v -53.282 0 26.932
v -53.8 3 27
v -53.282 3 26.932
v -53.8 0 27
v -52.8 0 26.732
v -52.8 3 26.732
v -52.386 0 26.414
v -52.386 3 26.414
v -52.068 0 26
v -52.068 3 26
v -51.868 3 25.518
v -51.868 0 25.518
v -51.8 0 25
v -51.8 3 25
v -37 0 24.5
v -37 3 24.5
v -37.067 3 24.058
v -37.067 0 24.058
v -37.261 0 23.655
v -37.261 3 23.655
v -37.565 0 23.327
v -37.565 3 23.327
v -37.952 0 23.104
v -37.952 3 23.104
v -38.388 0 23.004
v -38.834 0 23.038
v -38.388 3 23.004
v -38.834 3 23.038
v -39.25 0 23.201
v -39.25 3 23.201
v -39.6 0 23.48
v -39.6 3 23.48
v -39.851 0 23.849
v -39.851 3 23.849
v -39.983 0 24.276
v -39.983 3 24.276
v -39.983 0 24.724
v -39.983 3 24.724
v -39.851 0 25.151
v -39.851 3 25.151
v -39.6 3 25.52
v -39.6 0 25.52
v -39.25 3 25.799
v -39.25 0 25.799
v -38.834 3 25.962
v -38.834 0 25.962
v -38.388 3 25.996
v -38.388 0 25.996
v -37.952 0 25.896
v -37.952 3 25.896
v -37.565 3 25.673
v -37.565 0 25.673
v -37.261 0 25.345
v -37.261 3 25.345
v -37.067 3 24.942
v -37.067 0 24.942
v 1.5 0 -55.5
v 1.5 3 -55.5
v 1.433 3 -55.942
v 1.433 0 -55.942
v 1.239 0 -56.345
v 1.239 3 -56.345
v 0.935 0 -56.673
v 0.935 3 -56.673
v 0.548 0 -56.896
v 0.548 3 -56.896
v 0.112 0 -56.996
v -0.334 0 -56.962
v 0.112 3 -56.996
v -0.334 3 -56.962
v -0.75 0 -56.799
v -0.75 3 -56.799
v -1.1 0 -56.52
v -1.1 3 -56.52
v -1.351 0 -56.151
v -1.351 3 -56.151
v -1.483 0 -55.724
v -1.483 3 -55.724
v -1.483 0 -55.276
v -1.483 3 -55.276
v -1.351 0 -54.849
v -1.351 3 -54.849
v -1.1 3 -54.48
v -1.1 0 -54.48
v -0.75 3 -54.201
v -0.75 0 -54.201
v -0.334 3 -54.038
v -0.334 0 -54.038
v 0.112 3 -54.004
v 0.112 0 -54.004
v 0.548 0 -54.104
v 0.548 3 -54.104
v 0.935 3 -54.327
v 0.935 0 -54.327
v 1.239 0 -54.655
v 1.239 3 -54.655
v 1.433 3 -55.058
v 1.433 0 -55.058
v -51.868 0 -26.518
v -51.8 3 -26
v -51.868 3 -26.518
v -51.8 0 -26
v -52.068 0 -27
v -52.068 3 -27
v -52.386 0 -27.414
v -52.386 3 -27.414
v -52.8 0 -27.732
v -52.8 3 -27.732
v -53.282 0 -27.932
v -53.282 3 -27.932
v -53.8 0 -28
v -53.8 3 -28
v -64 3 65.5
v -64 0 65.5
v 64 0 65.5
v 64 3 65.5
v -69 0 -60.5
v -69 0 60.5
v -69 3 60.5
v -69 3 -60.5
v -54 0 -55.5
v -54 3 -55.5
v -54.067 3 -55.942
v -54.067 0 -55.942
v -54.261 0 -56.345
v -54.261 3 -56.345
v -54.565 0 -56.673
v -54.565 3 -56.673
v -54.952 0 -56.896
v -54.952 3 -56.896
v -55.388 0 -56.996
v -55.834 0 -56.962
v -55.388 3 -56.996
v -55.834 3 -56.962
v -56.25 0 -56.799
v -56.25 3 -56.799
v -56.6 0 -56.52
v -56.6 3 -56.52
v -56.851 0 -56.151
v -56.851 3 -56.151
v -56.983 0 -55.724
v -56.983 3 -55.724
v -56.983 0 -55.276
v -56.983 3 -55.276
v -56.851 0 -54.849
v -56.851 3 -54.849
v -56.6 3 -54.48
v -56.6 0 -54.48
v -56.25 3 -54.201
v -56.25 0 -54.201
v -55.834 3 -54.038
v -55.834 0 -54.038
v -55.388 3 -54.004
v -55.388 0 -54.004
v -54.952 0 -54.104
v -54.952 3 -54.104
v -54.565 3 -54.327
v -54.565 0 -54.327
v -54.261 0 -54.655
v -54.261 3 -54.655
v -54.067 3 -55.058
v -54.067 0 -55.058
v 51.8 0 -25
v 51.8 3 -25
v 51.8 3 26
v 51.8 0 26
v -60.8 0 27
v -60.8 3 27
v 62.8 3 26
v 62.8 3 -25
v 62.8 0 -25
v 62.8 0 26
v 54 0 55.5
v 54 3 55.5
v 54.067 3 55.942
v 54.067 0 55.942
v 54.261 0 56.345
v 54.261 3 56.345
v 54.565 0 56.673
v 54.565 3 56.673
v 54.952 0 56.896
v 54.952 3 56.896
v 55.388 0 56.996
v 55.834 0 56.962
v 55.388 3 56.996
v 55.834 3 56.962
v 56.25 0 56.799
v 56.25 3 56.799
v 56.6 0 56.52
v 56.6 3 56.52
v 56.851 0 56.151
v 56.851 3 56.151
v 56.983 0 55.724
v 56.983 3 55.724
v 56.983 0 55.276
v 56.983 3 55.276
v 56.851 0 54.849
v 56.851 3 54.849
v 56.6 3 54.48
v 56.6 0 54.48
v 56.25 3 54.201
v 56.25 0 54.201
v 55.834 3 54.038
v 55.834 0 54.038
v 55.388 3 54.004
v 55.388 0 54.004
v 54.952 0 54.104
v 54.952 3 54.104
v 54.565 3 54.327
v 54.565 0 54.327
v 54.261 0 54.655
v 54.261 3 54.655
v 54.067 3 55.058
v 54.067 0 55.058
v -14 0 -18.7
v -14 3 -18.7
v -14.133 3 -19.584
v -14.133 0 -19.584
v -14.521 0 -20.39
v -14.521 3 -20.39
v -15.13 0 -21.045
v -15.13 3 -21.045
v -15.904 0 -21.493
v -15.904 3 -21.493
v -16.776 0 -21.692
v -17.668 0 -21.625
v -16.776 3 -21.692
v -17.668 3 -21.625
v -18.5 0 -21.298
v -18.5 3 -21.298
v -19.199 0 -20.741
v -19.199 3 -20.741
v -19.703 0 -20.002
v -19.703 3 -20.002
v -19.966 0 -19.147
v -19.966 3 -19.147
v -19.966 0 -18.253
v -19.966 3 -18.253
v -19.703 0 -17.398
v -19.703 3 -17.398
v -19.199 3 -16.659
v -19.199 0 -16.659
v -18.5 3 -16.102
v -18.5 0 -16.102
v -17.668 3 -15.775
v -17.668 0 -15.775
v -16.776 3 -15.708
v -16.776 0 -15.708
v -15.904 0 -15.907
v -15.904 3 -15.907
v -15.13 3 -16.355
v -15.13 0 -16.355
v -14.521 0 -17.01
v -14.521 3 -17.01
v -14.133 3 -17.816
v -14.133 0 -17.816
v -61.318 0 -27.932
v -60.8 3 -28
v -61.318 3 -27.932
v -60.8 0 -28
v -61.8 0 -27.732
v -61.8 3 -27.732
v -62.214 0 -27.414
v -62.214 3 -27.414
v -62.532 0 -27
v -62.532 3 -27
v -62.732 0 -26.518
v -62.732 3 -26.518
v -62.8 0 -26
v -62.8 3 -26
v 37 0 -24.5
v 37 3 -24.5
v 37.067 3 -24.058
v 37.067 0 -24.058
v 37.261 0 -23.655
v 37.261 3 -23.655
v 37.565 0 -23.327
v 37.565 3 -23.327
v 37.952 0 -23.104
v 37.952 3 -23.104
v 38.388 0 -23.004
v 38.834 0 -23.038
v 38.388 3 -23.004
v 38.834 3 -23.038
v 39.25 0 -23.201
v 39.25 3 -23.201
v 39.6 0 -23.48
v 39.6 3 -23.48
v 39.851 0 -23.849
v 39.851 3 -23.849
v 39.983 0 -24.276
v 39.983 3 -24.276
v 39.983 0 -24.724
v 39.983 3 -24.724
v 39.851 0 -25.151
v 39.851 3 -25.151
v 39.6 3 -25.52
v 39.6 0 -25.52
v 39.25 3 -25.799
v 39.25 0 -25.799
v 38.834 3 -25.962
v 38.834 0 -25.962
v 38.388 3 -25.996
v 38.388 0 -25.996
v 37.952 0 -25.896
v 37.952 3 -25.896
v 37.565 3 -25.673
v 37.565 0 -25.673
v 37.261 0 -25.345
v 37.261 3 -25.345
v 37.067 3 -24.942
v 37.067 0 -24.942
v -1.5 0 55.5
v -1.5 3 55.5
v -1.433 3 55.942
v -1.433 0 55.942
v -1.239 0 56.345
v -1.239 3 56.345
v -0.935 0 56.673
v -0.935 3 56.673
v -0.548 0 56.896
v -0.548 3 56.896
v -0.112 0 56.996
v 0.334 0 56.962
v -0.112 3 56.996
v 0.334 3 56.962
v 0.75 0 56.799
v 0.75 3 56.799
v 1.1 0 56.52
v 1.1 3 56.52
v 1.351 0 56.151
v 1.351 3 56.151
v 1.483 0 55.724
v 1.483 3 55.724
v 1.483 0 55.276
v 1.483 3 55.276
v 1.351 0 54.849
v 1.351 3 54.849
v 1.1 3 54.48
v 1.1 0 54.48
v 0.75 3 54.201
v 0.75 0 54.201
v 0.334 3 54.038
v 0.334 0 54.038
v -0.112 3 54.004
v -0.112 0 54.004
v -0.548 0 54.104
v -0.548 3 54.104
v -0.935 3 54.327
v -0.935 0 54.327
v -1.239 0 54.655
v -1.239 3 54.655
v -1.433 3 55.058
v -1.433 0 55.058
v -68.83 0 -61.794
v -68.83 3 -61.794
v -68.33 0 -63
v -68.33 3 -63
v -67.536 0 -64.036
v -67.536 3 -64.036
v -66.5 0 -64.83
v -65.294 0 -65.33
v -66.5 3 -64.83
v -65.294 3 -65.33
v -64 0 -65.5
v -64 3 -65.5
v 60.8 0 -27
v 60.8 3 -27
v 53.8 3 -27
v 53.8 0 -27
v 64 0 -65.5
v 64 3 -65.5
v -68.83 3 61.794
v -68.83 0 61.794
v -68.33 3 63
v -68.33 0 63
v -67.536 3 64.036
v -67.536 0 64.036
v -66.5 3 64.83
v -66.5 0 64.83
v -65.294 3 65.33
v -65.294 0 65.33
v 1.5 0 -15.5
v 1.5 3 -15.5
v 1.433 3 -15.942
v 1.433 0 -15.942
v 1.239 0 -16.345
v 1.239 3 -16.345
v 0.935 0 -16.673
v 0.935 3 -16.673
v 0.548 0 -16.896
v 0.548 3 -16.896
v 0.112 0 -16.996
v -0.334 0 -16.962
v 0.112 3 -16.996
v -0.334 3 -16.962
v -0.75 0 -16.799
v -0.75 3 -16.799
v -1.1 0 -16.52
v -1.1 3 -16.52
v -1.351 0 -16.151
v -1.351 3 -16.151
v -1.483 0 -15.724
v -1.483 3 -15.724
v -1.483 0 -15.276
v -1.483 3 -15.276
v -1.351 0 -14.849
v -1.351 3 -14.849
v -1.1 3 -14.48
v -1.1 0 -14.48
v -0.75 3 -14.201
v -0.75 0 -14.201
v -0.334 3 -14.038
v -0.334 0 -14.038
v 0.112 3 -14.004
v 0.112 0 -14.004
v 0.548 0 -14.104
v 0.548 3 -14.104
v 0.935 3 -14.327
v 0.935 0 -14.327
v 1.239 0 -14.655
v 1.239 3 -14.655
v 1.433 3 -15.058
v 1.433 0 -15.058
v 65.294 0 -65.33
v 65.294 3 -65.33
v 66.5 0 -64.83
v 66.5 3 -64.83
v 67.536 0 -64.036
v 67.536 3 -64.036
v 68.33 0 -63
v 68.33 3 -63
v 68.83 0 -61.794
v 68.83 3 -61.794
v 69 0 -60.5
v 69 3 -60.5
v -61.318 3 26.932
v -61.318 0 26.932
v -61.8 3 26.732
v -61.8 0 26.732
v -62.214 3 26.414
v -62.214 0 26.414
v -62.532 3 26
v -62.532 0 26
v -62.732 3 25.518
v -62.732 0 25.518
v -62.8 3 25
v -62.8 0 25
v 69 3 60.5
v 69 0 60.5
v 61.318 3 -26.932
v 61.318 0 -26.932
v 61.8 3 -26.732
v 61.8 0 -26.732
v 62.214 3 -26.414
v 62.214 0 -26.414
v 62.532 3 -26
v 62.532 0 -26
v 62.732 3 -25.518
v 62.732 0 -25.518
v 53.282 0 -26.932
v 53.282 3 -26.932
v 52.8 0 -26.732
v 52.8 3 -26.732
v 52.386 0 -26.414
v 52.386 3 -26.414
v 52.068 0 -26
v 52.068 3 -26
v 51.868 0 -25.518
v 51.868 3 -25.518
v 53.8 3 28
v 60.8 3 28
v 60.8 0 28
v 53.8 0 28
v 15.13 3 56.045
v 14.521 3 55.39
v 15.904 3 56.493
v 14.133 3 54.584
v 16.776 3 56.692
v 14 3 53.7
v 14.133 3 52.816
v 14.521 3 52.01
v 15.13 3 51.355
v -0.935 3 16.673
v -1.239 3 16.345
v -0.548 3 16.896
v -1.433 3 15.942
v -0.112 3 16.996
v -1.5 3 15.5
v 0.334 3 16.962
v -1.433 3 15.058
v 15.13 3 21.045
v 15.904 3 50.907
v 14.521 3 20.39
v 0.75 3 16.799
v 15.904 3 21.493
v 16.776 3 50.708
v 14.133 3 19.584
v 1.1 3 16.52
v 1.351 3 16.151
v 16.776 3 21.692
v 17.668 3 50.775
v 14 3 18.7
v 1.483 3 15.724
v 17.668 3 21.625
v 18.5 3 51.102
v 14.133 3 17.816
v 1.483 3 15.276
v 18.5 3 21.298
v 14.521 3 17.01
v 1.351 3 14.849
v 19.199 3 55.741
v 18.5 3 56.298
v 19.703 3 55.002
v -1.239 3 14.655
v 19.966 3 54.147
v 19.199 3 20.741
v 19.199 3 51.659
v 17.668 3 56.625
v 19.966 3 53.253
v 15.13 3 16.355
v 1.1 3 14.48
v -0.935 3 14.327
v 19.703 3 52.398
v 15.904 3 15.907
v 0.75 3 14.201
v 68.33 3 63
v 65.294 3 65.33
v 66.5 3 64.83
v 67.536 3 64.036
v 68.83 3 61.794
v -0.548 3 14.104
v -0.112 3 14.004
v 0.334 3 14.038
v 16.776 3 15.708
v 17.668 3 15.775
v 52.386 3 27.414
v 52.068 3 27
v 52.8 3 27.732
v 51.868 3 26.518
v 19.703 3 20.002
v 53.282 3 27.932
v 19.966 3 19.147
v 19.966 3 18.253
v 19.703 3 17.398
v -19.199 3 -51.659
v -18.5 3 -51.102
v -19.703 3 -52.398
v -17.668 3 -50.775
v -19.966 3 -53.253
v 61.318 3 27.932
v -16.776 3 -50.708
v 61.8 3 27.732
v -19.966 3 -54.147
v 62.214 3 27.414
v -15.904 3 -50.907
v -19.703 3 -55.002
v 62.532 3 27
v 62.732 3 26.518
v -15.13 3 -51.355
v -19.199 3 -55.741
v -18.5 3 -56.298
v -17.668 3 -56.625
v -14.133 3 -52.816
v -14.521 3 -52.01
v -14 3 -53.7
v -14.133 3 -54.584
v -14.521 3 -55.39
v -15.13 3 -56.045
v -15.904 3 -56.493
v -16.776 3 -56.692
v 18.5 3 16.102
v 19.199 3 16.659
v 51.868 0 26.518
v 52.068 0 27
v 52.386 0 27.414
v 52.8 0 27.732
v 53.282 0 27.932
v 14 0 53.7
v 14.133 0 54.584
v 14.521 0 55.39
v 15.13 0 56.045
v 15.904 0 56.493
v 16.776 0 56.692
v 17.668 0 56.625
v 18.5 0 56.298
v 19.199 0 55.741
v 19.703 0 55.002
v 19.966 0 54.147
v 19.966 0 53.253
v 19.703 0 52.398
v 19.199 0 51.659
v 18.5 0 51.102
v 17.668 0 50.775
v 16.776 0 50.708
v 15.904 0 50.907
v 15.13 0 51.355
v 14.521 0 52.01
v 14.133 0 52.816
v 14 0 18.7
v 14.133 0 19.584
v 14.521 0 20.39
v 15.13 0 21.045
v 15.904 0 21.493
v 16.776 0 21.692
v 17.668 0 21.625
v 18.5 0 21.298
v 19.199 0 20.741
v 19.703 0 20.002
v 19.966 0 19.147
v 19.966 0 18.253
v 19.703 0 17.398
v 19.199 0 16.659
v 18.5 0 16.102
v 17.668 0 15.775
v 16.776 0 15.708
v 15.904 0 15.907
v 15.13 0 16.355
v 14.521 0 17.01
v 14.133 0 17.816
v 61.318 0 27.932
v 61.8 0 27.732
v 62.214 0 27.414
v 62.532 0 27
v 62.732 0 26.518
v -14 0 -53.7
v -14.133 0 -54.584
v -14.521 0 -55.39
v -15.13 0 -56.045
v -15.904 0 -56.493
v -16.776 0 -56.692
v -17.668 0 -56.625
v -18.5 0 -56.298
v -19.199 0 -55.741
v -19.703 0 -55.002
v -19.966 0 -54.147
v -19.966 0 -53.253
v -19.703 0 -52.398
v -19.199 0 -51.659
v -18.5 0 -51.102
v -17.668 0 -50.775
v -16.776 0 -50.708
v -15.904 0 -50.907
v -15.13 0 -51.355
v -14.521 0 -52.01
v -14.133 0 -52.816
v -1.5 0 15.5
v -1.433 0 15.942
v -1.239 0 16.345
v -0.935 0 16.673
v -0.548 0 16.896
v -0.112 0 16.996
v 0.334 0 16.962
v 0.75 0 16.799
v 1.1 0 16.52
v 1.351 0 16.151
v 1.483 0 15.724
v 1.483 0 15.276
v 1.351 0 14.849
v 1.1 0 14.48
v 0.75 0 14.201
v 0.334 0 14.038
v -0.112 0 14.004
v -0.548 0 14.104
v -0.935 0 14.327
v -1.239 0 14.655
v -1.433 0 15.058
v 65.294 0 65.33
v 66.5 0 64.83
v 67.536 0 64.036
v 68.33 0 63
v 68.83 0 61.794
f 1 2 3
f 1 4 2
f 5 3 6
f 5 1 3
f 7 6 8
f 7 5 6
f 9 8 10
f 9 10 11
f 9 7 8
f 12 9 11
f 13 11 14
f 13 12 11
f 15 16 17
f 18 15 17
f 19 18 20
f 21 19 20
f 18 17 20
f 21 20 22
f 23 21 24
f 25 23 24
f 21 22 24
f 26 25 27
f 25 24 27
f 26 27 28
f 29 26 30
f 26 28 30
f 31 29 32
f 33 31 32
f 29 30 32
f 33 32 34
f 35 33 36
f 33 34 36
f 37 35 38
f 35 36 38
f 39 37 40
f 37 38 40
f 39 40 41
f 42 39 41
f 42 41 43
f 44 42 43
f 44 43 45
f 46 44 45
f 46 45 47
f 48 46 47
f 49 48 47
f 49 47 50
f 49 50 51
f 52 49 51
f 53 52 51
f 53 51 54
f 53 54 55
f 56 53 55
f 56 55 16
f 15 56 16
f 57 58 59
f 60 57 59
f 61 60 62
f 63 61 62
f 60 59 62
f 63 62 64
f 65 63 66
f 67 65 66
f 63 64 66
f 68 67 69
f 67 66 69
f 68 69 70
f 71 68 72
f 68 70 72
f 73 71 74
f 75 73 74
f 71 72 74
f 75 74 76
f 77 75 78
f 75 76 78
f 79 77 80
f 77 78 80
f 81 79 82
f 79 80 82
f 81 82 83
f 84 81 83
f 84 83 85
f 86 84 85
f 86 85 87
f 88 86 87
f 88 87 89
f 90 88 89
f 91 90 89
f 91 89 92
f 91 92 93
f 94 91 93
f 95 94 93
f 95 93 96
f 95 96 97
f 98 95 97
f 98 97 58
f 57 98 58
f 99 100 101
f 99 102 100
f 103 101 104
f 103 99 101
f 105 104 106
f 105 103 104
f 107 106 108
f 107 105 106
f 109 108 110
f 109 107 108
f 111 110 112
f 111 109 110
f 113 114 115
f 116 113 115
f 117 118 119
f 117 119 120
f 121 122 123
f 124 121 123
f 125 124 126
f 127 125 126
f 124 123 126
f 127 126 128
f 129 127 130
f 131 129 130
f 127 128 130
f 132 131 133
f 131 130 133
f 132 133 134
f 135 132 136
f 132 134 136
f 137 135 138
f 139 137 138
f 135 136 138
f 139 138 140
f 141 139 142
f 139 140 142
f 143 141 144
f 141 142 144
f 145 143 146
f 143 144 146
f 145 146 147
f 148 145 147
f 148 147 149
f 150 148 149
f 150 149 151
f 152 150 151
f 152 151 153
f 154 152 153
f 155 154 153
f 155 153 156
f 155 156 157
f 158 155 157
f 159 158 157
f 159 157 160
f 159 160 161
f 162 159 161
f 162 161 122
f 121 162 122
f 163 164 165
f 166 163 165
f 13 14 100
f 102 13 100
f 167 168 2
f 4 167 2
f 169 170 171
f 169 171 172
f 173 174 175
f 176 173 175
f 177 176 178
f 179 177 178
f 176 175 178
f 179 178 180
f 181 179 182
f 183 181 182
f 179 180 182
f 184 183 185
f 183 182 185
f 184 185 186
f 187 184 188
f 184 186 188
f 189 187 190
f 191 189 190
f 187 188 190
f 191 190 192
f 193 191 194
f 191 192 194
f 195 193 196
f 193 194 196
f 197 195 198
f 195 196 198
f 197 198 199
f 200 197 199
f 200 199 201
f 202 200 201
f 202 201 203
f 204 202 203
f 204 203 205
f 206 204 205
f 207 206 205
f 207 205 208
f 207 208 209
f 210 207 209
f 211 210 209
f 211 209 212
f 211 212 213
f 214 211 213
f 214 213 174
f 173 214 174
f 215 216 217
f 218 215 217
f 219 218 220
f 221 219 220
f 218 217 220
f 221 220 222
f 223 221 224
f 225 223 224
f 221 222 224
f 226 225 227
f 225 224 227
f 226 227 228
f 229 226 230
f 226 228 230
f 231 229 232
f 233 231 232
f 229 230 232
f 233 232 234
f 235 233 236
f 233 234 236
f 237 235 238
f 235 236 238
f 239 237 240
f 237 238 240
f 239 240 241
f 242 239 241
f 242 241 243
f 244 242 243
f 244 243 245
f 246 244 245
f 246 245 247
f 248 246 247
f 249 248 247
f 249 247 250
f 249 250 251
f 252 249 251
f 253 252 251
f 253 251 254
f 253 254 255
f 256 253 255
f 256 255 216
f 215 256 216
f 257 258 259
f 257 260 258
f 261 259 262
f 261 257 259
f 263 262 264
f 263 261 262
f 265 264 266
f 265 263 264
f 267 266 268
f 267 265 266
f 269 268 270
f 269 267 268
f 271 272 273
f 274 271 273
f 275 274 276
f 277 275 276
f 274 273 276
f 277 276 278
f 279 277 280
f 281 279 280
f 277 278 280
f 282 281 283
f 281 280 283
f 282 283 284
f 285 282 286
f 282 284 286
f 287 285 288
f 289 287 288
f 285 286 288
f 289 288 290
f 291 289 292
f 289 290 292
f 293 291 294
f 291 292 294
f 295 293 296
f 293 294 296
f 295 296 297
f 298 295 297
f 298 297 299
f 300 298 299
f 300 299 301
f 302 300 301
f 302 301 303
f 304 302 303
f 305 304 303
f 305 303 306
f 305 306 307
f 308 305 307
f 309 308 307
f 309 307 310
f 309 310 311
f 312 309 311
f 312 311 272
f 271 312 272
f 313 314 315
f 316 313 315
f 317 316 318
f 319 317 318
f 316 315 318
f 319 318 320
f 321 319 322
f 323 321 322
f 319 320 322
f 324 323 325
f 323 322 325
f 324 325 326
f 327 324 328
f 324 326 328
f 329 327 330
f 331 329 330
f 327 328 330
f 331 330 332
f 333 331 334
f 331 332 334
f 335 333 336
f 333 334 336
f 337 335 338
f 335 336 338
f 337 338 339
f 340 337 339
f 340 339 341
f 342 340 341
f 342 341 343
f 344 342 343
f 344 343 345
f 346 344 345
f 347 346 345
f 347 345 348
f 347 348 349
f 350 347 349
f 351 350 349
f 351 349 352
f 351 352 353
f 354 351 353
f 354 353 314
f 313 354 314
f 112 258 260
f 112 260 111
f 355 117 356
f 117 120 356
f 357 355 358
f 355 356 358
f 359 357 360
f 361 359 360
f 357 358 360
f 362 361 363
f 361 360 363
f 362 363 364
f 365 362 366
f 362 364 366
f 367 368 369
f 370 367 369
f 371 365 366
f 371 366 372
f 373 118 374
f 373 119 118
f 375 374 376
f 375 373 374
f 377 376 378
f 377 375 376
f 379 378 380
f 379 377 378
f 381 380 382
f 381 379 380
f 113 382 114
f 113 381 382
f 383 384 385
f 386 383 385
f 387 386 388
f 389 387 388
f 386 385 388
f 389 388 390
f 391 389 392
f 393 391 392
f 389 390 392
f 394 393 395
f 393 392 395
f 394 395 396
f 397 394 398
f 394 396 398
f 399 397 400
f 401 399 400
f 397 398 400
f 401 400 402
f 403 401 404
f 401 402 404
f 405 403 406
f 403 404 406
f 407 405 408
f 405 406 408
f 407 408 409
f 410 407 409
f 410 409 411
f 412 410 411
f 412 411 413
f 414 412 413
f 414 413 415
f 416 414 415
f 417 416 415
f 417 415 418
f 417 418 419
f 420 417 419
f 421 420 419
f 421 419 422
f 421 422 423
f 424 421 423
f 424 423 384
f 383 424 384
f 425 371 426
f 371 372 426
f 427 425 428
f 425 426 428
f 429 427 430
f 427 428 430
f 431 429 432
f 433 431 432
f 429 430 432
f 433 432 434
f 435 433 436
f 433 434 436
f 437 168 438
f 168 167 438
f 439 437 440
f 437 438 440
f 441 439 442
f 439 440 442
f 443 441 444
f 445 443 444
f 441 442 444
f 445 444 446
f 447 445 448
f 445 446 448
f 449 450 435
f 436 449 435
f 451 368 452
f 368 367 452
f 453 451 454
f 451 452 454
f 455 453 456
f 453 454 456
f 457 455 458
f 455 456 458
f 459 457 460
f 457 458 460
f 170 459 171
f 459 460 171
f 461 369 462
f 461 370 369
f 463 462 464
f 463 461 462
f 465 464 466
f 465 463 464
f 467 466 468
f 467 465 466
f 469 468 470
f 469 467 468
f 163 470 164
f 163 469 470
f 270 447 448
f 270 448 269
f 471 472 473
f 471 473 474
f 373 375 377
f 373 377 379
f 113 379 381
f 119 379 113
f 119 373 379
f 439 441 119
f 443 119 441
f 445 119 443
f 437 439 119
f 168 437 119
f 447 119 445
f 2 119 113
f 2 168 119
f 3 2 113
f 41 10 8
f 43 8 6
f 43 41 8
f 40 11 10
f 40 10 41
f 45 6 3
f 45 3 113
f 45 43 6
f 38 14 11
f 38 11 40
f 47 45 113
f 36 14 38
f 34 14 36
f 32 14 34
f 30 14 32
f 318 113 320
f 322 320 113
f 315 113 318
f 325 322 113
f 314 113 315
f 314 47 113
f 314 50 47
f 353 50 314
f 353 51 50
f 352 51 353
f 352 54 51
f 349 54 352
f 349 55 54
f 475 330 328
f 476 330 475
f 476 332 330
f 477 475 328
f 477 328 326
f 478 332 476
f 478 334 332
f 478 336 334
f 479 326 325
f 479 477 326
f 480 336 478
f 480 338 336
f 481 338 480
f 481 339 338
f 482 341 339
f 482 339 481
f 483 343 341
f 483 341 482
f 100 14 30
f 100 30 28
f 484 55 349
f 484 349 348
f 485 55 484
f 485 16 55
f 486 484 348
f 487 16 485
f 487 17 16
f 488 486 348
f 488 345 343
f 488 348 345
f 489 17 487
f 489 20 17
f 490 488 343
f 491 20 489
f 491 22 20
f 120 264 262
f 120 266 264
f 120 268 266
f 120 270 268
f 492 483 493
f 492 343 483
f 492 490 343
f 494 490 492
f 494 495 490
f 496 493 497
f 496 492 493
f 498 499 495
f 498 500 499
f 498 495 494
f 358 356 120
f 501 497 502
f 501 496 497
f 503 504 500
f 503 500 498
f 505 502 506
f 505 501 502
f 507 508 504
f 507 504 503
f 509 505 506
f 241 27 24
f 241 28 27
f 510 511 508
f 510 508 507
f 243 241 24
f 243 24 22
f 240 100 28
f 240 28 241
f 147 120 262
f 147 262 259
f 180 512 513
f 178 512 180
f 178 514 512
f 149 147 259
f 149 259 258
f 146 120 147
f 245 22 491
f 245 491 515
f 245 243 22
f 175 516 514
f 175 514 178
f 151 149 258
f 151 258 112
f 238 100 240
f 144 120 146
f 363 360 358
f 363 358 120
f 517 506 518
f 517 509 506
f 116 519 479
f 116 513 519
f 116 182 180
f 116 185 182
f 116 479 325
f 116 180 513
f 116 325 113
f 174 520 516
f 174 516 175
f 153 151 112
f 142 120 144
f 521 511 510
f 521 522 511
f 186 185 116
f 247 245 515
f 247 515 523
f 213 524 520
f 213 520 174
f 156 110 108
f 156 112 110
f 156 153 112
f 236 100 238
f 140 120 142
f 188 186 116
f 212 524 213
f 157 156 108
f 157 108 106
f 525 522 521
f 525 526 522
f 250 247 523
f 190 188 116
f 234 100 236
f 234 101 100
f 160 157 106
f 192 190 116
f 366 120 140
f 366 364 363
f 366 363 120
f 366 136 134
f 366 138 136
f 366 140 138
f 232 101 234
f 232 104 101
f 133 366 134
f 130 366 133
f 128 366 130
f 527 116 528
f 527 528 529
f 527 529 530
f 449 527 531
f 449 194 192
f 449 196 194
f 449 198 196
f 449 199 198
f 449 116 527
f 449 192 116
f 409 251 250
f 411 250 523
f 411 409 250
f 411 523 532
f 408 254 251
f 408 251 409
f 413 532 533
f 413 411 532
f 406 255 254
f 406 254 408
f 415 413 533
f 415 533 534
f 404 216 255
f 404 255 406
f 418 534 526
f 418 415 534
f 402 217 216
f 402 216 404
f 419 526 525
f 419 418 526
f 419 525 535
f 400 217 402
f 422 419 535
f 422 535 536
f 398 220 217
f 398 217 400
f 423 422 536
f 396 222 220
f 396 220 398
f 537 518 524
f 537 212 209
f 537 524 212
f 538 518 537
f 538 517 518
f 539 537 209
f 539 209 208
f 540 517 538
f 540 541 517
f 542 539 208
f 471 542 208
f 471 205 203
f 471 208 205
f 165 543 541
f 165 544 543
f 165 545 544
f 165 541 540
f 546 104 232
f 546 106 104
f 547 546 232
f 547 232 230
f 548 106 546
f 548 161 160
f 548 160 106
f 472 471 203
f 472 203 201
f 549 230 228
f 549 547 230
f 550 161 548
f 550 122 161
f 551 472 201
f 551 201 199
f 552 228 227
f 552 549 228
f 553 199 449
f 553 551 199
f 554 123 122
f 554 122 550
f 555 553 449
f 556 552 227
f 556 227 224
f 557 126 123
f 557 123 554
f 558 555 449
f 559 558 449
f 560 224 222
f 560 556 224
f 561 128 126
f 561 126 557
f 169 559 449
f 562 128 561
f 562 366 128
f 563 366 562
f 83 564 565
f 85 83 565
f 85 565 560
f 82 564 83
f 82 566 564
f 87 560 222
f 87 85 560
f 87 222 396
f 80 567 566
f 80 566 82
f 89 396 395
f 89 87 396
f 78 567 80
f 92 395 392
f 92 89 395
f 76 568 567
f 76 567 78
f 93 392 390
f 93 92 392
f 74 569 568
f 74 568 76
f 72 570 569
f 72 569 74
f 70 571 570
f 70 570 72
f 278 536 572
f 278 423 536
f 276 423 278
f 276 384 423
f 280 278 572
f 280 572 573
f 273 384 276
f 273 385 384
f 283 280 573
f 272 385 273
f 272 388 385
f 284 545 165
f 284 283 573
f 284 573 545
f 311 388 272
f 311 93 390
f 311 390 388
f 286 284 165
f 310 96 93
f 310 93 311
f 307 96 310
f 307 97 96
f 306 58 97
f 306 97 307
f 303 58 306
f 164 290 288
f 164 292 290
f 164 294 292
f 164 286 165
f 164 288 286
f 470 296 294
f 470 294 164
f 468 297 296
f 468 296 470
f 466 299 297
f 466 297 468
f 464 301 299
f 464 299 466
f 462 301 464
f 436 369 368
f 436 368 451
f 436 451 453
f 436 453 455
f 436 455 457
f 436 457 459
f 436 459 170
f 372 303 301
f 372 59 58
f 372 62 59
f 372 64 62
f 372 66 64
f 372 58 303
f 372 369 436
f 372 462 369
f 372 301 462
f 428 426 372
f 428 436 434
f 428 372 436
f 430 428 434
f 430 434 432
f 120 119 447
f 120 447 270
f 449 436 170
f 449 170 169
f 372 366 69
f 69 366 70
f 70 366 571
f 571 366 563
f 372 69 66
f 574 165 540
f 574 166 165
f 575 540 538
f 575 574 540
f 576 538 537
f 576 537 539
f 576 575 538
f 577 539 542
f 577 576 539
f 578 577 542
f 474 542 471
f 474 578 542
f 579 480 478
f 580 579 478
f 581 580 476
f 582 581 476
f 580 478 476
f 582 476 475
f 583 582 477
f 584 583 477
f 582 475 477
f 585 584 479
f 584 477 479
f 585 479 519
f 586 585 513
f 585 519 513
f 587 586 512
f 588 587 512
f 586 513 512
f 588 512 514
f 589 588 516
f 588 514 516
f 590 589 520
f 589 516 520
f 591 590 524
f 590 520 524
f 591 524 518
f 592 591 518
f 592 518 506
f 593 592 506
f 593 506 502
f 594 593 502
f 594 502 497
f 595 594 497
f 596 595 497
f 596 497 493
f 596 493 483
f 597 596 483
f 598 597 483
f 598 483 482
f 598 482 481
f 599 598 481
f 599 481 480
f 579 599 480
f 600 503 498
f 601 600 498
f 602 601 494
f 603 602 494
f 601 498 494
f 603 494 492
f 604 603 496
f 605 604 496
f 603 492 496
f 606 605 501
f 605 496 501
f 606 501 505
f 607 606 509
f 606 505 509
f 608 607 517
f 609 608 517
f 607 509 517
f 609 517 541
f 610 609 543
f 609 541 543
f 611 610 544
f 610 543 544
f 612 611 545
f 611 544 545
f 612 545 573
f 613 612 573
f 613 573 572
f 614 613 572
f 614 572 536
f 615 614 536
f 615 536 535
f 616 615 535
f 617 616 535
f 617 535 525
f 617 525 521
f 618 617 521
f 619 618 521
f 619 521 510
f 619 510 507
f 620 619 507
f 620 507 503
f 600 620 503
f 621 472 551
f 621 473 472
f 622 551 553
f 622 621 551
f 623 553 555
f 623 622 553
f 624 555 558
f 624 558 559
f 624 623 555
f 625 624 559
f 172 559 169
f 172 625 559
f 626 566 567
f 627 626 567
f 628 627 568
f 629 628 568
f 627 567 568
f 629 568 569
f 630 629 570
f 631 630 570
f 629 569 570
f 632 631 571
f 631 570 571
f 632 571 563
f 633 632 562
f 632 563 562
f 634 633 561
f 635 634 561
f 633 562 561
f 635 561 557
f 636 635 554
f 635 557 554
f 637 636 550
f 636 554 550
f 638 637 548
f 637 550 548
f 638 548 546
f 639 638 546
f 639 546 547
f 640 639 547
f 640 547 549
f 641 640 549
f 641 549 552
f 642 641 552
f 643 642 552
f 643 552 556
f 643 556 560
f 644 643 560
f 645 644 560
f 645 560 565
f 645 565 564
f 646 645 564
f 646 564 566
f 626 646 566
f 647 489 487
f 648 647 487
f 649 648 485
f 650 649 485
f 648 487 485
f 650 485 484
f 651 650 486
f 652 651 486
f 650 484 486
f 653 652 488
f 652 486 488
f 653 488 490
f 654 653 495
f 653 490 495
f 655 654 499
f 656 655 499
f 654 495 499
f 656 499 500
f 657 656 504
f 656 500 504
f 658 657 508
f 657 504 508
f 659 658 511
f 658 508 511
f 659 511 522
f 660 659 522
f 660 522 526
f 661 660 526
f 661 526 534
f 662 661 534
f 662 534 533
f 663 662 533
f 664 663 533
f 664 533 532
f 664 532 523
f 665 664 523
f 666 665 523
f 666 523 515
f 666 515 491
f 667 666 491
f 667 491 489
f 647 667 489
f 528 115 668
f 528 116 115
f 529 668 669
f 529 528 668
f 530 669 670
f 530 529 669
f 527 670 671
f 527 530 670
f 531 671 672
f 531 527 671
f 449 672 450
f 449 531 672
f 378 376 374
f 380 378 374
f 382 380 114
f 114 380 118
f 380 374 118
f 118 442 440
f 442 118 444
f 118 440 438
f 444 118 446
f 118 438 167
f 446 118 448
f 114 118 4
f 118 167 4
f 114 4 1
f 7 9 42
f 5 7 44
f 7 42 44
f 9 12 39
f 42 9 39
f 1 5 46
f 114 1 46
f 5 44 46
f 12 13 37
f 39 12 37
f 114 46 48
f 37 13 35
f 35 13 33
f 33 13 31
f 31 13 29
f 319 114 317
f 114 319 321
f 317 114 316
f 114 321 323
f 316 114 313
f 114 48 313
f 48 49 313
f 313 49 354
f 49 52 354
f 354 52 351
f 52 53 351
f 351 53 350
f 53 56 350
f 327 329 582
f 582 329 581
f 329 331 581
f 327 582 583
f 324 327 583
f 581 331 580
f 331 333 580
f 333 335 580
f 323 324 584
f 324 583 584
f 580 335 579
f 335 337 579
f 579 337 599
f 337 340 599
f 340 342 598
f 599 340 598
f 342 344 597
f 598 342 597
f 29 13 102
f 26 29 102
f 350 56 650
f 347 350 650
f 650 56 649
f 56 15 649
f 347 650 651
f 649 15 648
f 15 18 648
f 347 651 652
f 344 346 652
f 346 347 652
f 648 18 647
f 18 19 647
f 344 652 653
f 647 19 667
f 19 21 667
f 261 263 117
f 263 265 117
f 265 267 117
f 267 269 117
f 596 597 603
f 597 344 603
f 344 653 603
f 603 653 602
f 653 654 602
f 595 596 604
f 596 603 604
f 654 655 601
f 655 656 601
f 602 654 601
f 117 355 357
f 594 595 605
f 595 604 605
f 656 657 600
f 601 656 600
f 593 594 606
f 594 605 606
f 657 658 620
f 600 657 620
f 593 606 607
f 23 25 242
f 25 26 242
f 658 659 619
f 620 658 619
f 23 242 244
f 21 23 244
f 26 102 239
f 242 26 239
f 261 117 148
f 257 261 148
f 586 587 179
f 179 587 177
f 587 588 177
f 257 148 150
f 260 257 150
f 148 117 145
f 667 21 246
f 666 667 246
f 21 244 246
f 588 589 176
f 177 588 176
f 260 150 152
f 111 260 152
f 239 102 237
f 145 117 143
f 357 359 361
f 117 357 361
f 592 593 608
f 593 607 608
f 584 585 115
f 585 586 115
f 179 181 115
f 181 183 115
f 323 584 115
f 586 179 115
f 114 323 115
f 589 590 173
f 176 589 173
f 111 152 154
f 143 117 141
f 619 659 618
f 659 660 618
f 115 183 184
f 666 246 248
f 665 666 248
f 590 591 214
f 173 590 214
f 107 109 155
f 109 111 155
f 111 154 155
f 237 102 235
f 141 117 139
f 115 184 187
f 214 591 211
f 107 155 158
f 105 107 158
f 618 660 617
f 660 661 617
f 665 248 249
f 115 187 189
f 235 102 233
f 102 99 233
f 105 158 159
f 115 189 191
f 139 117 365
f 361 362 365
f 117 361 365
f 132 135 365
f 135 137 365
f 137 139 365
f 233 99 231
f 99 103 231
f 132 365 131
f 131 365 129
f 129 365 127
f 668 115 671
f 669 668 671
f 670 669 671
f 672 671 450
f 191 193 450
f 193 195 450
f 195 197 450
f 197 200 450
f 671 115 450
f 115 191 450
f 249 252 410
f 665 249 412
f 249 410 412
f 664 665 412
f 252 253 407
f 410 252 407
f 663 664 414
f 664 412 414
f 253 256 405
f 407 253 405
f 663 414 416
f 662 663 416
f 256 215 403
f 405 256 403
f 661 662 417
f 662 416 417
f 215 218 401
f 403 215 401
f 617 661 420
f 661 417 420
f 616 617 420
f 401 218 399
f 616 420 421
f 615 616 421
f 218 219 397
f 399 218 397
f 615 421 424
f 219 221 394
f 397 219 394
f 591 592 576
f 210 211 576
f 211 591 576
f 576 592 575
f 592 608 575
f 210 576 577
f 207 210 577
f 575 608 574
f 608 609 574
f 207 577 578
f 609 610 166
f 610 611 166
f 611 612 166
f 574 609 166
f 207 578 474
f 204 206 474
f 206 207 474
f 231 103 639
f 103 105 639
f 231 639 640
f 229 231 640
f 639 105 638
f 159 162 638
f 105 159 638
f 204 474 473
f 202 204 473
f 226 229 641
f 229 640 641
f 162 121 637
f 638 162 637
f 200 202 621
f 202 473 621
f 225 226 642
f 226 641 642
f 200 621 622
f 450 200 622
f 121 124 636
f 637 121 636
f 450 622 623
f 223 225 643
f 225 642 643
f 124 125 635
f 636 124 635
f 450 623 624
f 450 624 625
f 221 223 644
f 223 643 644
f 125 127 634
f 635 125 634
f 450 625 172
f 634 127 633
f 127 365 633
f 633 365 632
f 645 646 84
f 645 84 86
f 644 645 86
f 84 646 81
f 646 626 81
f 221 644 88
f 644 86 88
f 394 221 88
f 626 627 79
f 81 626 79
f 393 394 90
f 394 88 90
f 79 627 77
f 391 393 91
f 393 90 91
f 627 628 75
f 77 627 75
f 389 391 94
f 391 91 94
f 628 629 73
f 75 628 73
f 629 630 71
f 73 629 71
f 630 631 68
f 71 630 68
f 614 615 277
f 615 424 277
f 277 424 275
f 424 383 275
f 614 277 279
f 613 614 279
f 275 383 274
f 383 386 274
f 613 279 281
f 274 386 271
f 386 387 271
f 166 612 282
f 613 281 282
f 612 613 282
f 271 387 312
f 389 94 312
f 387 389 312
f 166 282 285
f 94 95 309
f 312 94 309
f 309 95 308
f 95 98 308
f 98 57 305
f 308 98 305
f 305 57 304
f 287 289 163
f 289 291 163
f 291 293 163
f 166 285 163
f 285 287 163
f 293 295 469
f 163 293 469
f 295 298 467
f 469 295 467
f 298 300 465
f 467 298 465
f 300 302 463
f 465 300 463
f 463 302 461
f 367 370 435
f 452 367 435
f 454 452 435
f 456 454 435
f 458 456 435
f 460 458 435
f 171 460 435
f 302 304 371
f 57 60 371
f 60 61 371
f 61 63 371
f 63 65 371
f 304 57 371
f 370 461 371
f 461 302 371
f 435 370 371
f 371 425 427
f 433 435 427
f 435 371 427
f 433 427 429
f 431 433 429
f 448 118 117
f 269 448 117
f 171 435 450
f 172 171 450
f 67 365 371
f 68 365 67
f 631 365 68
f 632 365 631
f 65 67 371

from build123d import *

# Parameters (mm, degrees)
SKETCH1_W                = 138
SKETCH1_H                = 131
BOSS_EXTRUDE1_DEPTH      = 3
SKETCH2_R                = 3
SKETCH2_R_2              = 1.5
SKETCH2_W                = 11
SKETCH2_H                = 55
CUT_EXTRUDE1_DEPTH       = 96.185345511
FILLET1_R                = 5
FILLET2_R                = 2
CIRPATTERN1_COUNT        = 2
FILLET2_OF_CIRPATTERN1_R = 2


with BuildPart() as part:
    # Sketch1 → Boss-Extrude1 (new body)
    with BuildSketch(Plane(origin=(0, 0, 0), x_dir=(1, 0, 0), z_dir=(0, 1, 0))):
        Rectangle(SKETCH1_W, SKETCH1_H)
    extrude(amount=BOSS_EXTRUDE1_DEPTH)

    # Sketch2 → Cut-Extrude1 (cut, through all)
    with BuildSketch(Plane(origin=(0, 3, 0), x_dir=(1, 0, 0), z_dir=(0, 1, 0))):
        with Locations((-17, 18.7)):
            Circle(SKETCH2_R)
        with Locations((-17, 53.7)):
            Circle(SKETCH2_R)
        with Locations((0, 55.5)):
            Circle(SKETCH2_R_2)
        with Locations((0, 15.5)):
            Circle(SKETCH2_R_2)
        with Locations((-55.5, 55.5)):
            Circle(SKETCH2_R_2)
        with Locations((-38.5, -24.5)):
            Circle(SKETCH2_R_2)
        with Locations((-57.3, 0.5)):
            Rectangle(SKETCH2_W, SKETCH2_H)
    cut_extrude1 = extrude(amount=-CUT_EXTRUDE1_DEPTH, mode=Mode.SUBTRACT)

    # Fillet1
    fillet1_edges = [part.edges().sort_by_distance(p)[0] for p in [
        (-69, 1.5, -65.5),
        (69, 1.5, -65.5),
        (69, 1.5, 65.5),
        (-69, 1.5, 65.5),
    ]]
    fillet(fillet1_edges, radius=FILLET1_R)

    # Fillet2
    fillet2_edges = [part.edges().sort_by_distance(p)[0] for p in [
        (-62.8, 1.5, -28),
        (-51.8, 1.5, -28),
        (-51.8, 1.5, 27),
        (-62.8, 1.5, 27),
    ]]
    fillet(fillet2_edges, radius=FILLET2_R)

    # CirPattern1: Cut-Extrude1 ×2 about axis
    cirpattern1_axis = Axis((0, -0.15, 0), (0, 1, 0))
    for i in range(1, CIRPATTERN1_COUNT):
        add(cut_extrude1.rotate(cirpattern1_axis, i * 360 / CIRPATTERN1_COUNT), mode=Mode.SUBTRACT)

    # Fillet2 of CirPattern1
    fillet2_of_cirpattern1_edges = [part.edges().sort_by_distance(p)[0] for p in [
        (62.8, 1.5, 28),
        (51.8, 1.5, 28),
        (51.8, 1.5, -27),
        (62.8, 1.5, -27),
    ]]
    fillet(fillet2_of_cirpattern1_edges, radius=FILLET2_OF_CIRPATTERN1_R)


solid = part.part
